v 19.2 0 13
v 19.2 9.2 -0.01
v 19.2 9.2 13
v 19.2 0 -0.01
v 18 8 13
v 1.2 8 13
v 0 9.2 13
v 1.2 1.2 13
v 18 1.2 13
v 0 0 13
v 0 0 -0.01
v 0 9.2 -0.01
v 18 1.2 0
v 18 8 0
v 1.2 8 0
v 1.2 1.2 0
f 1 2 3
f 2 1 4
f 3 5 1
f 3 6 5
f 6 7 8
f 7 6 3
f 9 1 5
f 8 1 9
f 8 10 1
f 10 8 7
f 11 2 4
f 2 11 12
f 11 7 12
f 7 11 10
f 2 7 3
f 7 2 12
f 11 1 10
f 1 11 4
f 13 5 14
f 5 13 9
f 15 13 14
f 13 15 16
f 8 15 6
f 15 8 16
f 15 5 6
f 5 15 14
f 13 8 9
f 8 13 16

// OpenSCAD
// file: ../Base/Boxes.scad
// Fischertechnik Box Foundation
// Pre-designed Boxes

use <Constants.scad>

include <PlacementOptions.scad>

box190Width = 190;
box190Depth = 130;
box130Width = 130;
box130Depth = 95;
boxUsageHeight = 33.9;
boxWallThickness = 2.4;
boxBaseThickness = 1.0;

// getBoxWallThickness()
// Gets the wall thickness of a Fischertechnik Box

function getBoxWallThickness() = boxWallThickness;

// Gets the usable height of a fischertechnik box
function getBoxUsageHeight() = boxUsageHeight;

// Gets the thickness of the Fischertechnik box base.
function getBoxBaseThickness() = boxBaseThickness;

// Gets the usable inner space of a Box 190 as an x/y-list
function getBox190Space() = [
    box190Width - 2*getBoxWallThickness(), 
    box190Depth - 2*getBoxWallThickness() ];

// Imports the Fischertechnik empty box 130x190 mm and places it at position 0,0
// 190x130 are the outer sizes, the inner space is slightly smaller. Use getBox190Space() to get the inner sizes.
// This module needs the STL file "Fischertechnik Box 130x190.stl" in the library path.
// The box is positioned that the usable inner space is at the 0,0,0 position. The

module Box190() {
    translate([-getBoxWallThickness(),-getBoxWallThickness(),-getBoxBaseThickness()])
        import("Fischertechnik Box 130x190.stl", convexity=3);
}

// Gets the usable inner space of a Box 130 as an x/y-list
function getBox130Space() = [
    box130Width - 2*getBoxWallThickness(), 
    box130Depth - 2*getBoxWallThickness() ];

// Imports the Fischertechnik empty box 95x130 mm and places it at position 0,0
// 190x130 are the outer sizes, the inner space is slightly smaller. Use getBox190Space() to get the inner sizes.
// This module needs the STL file "Fischertechnik Box 95x130.stl" in the library path.
// The box is positioned that the usable inner space is at the 0,0,0 position. The

module Box130() {
    translate([-getBoxWallThickness(),-getBoxWallThickness(),-getBoxBaseThickness()])
        import("Fischertechnik Box 95x130.stl", convexity=3);
}

// Creates a web at the specified box walls
// corner 0 = LowerLeft, 1 = UpperLeft, 2 = UpperRight, 3 = LowerRight
// side 0 = LeftOfCorner, 1 = RightOfCorner
// distance = Distance in mm from the corner
// box = inner width and depth of the box (default: Box 190)
// webWidth = length of the web (default is 3 mms)
// webThickness = thickness of the web (default is 1 mm)

module BoxWeb(corner, side, distance, box=getBox190Space(), webWidth=3, webThickness=1.0) {
    sink = getBoxWallThickness()/2;

    width = (corner % 2 == 0) ? 
            (side == LeftOfCorner ? webWidth : webThickness) :
            (side == LeftOfCorner ? webThickness : webWidth);

    depth = (corner % 2 == 0) ? 
            (side == RightOfCorner ? webWidth : webThickness) :
            (side == RightOfCorner ? webThickness : webWidth);
    
    xDiff = corner == LowerLeft ? 
                (side == LeftOfCorner ? -sink : distance) :
            (corner == UpperLeft ?                
                (side == LeftOfCorner ? distance : -sink) :
            (corner == UpperRight ?
                (side == LeftOfCorner ? box.x-webWidth+sink : box.x-distance-webThickness) :
                (side == LeftOfCorner ? box.x-distance-webThickness: box.x-webWidth+sink)));

    yDiff = corner == LowerLeft ? 
                (side == RightOfCorner ? -sink : distance) :
            (corner == UpperLeft ?
                (side == RightOfCorner ? box.y-distance : box.y-webWidth+sink) :
            (corner == UpperRight ?
                (side == RightOfCorner ? box.y-webWidth+sink : box.y-distance) :
                (side == RightOfCorner ? distance : -sink)));
    
    translate([xDiff, yDiff, -getExcess()])
        cube([width, depth, boxUsageHeight + 2*getExcess()]);
}
// file: ../Base/Rotation.scad
// Fischertechnik Box Foundation
// Geometry Helpers Rotation

include <PlacementOptions.scad>

// getRotatedSpace(space, rotation=NoRotation)
// Rotates the space dependent on the specified rotation

function getRotatedSpace(space, rotation=NoRotation) = [
    (rotation == Rotate90 || rotation == Rotate270) ? space.y : space.x,
    (rotation == Rotate90 || rotation == Rotate270) ? space.x : space.y
];

// Rotates the given space around the fixed left lower corner
// space = the space the children needs as width/depth list [width,depth]
// rotation = 0 Rotate0 degrees, 1 Rotate90 degrees, 2 Rotate180 degrees, 3 Rotate270 degrees (equivalent to -90)

module RotateFix(space, rotation=Rotate0) {
    dy = (rotation == Rotate0 || rotation == Rotate270) ? 0 :
        (rotation == Rotate90) ? space.x :
        space.y;
    dx = (rotation < Rotate180) ? 0 :
        (rotation == Rotate180) ? space.x :
        space.y;
    
    translate([dx, dy, 0])
        rotate([0, 0, rotations[rotation]])
            children();
}
// file: ../Base/Alignment.scad
// Fischertechnik Box Foundation
// Geometry Helpers Alignment

include <PlacementOptions.scad>

// getAlignedX(elementWidth, spaceWidth, align=AlignRight, offset=0)
// Gets the aligned X offset of an element with the given
// width in the given space.
// elementWidth = The width of the element to positon
// spaceWidth = The space where the element should be aligned
// align = 0 AlignLeft, 1 AlignCenter, 2 AlignRight
// offset = an optional offset from the aligned position. When
// aligned left or centered, then positive values are in X direction.
// When aligned right then positive values are in negative X direction.

function getAlignedX(elementWidth, spaceWidth, align=AlignRight, offset=0) =
    (align == AlignLeft) ?
        offset :
        ((align == AlignCenter) ?
        (spaceWidth - elementWidth)/2 + offset :
        spaceWidth - offset - elementWidth);

// getAlignedY(elementDepth, spaceDepth, align=AlignTop, offset=0)
// Gets the aligned Y offset of an element with the given
// depth in the given space.
// elementDepth = The depth of the element to positon
// spaceDepth = The space where the element should be aligned
// align = 0 AlignBottom, 1 AlignCenter, 2 AlignTop
// offset = an optional offset from the aligned position. When
// aligned bottom or centered, then positive values are in Y direction.
// When aligned top then positive values are in negative Y direction.

function getAlignedY(elementDepth, spaceDepth, align=AlignTop, offset=0) =
    (align == AlignBottom) ?
        offset :
        ((align == AlignCenter) ?
        (spaceDepth - elementDepth)/2 + offset :
        spaceDepth - offset - elementDepth);
// file: ../Base/PlacementOptions.scad
// Fischertechnik Box Foundation
// Placement Options

// Alignment
NoAlign = 0;
AlignLeft = 1;
AlignBottom = 2;
AlignCenter = 3;
AlignRight = 4;
AlignTop = 5;

// Element rotation degree steps
rotations = [0, -90, -180, -270];

// Rotation
NoRotation = 0;
Rotate0 = 0;
Rotate90 = 1;
Rotate180 = 2;
Rotate270 = 3;

// Docking (seen from above)
NoDock = -1;
DockLeft = 0;
DockTop = 1;
DockRight = 2;
DockCorner = 2;
DockBottom = 3;

// Web corners
LowerLeft = 0;
UpperLeft = 1;
UpperRight = 2;
LowerRight = 3;

// Web position relative to corner
LeftOfCorner = 0;
RightOfCorner = 1;
// file: ../Base/Placement.scad
// Fischertechnik Box Foundation
// Geometry Helpers Placement

use <Constants.scad>
use <Alignment.scad>
use <Rotation.scad>
use <Boxes.scad>

include <PlacementOptions.scad>

// Place(x=0, y=0, elementSpace=[0,0], alignX=AlignLeft, alignY=AlignBottom, rotation=Rotate0, boxSpace=getBox190Space())
// Places the child at the specified position
// y = Y-Position. This is a relative position when an X aligment is specified.
// x = X-Position. This is a relative position when an Y aligment is specified.
// elementSpace = space of the element to be placed [x,y]
// alignX = -1=NoAlign, 0 AlignLeft, 1 AlignCenter, 3 AlignRight (elementSpace and boxSpace required!)
// alignY = -1=NoAlign, 2 AlignBottom, 1 AlignCenter, 4 AlignTop (elementSpace and boxSpace required!)
// rotation = 0 Rotate0 0 degrees, 1 Rotate90 90 degrees, 
// 2 Rotate180 180 degrees, 3 Rotate270 270 degrees (equivalent to -90)
// boxSpace = Inner space of the box where the placement occurs [x,y] - default is Box 190x130 inner space

module Place(x=0, y=0, elementSpace=[0,0], 
  alignX=AlignLeft, alignY=AlignBottom, 
  rotation=NoRotation, boxSpace=getBox190Space()) {

    module Position(x, y, space, rotation=Rotate0) {
        translate([x, y, 0])
            RotateFix(space, rotation)
                children(0);
    }

    space = getRotatedSpace(elementSpace, rotation);
    alignedX = getAlignedX(space.x, boxSpace.x, alignX, x);
    alignedY = getAlignedY(space.y, boxSpace.y, alignY, y);
    Position(alignedX, alignedY, elementSpace, rotation)
        children(0);
}

// Center(space=getBox130Space(), elementSpace=[0,0])
// space = Space where the children is centered. For cylinder use centered=true and no elementSpace.
// elementSpace = space of the element to be centered [x,y]

module Center(space=getBox190Space(), elementSpace=[0,0]) {
    translate([(space.x - elementSpace.x) / 2, (space.y - elementSpace.y) / 2])
        children(0);
}

// CenterHorizontal(width=0, y=0, offset=0, space=getBox130Space())
// space = Space where the children is centered. For cylinder use centered=true and no elementSpace.
// elementSpace = space of the element to be centered [x,y]

module CenterHorizontal(width=0, y=0, offset=0, space=getBox190Space()) {
    translate([(space.x - width) / 2 + offset, y])
        children(0);
}

// CenterVertical(depth=0, x=0, offset=0, space=getBox130Space())
// space = Space where the children is centered. For cylinder use centered=true and no elementSpace.
// elementSpace = space of the element to be centered [x,y]

module CenterVerticalal(depth=0, x=0, offset=0, space=getBox190Space()) {
    translate([x, (space.y - depth) / 2 + offset])
        children(0);
}
// file: ../Base/Constants.scad
// Fischertechnik Box Foundation
// Constants

// Constant values necessary for multiple elements

// Base constants
dividerThickness = 1.2;
excess = 0.01;
fragments = 90;
tolerance = 0.8;

// Gets the thickness of a divider 
function getDividerThickness() = dividerThickness;

// Gets the excess that is used to merge walls into each other
function getExcess() = excess;

// Gets amount of fragments of a cylinder
function getFragments() = fragments;

// Gets the inner tolerance of a frame to each side
function getTolerance() = tolerance;


// Fischertechnik specific constants
axisDiameter = 4;
axisBottomDiameter = axisDiameter + 1;
standardEdgeDistance = 2.5;
standardWebDistance = 11.5;
standardCornerLength = 15;
tubeWallFactor = 1.6;

// Gets axis diameter
function getAxisDiameter() = axisDiameter;

// Gets axis bottom diameter for thicker part at the bottom
function getAxisBottomDiameter() = axisBottomDiameter;

// gets the standard distance to the wall of the box for dockable frames with webs
function getStandardEdgeDistance() = standardEdgeDistance;

// gets the standard distance of each web to the corner of the dockable frame
function getStandardWebDistance() = standardWebDistance;

// gets the standard length of the corner walls of a dockable frame
function getStandardCornerLength() = standardCornerLength;

// gets the wall thickness of a tube.
function getTubeWallThickness() = tubeWallFactor * getDividerThickness();
// main file
// Fischertechnik Box Library
// Frame for Plugged Resistor (two plugs)
// 36381

use <../ModelBase/Simple.scad>

width = 16;
depth = 6;
height = 13;

// getFramePluggedResistorSpace()
// Gets the space the frame for a plugged capacitor needs as width and depth (.x and .y as a list)

function getFramePluggedResistorSpace() = getFrameOuterVolume([width, depth, height]);

// FramePluggedResistor()
// The walls of the frame are 13 mm high. 
// The complete frame has a tolerance of addition 1 mm in each direction.

module FramePluggedResistor() {
    Frame([width, depth, height]);
}

// Tests
color("lightgray") {
FramePluggedResistor();
}
